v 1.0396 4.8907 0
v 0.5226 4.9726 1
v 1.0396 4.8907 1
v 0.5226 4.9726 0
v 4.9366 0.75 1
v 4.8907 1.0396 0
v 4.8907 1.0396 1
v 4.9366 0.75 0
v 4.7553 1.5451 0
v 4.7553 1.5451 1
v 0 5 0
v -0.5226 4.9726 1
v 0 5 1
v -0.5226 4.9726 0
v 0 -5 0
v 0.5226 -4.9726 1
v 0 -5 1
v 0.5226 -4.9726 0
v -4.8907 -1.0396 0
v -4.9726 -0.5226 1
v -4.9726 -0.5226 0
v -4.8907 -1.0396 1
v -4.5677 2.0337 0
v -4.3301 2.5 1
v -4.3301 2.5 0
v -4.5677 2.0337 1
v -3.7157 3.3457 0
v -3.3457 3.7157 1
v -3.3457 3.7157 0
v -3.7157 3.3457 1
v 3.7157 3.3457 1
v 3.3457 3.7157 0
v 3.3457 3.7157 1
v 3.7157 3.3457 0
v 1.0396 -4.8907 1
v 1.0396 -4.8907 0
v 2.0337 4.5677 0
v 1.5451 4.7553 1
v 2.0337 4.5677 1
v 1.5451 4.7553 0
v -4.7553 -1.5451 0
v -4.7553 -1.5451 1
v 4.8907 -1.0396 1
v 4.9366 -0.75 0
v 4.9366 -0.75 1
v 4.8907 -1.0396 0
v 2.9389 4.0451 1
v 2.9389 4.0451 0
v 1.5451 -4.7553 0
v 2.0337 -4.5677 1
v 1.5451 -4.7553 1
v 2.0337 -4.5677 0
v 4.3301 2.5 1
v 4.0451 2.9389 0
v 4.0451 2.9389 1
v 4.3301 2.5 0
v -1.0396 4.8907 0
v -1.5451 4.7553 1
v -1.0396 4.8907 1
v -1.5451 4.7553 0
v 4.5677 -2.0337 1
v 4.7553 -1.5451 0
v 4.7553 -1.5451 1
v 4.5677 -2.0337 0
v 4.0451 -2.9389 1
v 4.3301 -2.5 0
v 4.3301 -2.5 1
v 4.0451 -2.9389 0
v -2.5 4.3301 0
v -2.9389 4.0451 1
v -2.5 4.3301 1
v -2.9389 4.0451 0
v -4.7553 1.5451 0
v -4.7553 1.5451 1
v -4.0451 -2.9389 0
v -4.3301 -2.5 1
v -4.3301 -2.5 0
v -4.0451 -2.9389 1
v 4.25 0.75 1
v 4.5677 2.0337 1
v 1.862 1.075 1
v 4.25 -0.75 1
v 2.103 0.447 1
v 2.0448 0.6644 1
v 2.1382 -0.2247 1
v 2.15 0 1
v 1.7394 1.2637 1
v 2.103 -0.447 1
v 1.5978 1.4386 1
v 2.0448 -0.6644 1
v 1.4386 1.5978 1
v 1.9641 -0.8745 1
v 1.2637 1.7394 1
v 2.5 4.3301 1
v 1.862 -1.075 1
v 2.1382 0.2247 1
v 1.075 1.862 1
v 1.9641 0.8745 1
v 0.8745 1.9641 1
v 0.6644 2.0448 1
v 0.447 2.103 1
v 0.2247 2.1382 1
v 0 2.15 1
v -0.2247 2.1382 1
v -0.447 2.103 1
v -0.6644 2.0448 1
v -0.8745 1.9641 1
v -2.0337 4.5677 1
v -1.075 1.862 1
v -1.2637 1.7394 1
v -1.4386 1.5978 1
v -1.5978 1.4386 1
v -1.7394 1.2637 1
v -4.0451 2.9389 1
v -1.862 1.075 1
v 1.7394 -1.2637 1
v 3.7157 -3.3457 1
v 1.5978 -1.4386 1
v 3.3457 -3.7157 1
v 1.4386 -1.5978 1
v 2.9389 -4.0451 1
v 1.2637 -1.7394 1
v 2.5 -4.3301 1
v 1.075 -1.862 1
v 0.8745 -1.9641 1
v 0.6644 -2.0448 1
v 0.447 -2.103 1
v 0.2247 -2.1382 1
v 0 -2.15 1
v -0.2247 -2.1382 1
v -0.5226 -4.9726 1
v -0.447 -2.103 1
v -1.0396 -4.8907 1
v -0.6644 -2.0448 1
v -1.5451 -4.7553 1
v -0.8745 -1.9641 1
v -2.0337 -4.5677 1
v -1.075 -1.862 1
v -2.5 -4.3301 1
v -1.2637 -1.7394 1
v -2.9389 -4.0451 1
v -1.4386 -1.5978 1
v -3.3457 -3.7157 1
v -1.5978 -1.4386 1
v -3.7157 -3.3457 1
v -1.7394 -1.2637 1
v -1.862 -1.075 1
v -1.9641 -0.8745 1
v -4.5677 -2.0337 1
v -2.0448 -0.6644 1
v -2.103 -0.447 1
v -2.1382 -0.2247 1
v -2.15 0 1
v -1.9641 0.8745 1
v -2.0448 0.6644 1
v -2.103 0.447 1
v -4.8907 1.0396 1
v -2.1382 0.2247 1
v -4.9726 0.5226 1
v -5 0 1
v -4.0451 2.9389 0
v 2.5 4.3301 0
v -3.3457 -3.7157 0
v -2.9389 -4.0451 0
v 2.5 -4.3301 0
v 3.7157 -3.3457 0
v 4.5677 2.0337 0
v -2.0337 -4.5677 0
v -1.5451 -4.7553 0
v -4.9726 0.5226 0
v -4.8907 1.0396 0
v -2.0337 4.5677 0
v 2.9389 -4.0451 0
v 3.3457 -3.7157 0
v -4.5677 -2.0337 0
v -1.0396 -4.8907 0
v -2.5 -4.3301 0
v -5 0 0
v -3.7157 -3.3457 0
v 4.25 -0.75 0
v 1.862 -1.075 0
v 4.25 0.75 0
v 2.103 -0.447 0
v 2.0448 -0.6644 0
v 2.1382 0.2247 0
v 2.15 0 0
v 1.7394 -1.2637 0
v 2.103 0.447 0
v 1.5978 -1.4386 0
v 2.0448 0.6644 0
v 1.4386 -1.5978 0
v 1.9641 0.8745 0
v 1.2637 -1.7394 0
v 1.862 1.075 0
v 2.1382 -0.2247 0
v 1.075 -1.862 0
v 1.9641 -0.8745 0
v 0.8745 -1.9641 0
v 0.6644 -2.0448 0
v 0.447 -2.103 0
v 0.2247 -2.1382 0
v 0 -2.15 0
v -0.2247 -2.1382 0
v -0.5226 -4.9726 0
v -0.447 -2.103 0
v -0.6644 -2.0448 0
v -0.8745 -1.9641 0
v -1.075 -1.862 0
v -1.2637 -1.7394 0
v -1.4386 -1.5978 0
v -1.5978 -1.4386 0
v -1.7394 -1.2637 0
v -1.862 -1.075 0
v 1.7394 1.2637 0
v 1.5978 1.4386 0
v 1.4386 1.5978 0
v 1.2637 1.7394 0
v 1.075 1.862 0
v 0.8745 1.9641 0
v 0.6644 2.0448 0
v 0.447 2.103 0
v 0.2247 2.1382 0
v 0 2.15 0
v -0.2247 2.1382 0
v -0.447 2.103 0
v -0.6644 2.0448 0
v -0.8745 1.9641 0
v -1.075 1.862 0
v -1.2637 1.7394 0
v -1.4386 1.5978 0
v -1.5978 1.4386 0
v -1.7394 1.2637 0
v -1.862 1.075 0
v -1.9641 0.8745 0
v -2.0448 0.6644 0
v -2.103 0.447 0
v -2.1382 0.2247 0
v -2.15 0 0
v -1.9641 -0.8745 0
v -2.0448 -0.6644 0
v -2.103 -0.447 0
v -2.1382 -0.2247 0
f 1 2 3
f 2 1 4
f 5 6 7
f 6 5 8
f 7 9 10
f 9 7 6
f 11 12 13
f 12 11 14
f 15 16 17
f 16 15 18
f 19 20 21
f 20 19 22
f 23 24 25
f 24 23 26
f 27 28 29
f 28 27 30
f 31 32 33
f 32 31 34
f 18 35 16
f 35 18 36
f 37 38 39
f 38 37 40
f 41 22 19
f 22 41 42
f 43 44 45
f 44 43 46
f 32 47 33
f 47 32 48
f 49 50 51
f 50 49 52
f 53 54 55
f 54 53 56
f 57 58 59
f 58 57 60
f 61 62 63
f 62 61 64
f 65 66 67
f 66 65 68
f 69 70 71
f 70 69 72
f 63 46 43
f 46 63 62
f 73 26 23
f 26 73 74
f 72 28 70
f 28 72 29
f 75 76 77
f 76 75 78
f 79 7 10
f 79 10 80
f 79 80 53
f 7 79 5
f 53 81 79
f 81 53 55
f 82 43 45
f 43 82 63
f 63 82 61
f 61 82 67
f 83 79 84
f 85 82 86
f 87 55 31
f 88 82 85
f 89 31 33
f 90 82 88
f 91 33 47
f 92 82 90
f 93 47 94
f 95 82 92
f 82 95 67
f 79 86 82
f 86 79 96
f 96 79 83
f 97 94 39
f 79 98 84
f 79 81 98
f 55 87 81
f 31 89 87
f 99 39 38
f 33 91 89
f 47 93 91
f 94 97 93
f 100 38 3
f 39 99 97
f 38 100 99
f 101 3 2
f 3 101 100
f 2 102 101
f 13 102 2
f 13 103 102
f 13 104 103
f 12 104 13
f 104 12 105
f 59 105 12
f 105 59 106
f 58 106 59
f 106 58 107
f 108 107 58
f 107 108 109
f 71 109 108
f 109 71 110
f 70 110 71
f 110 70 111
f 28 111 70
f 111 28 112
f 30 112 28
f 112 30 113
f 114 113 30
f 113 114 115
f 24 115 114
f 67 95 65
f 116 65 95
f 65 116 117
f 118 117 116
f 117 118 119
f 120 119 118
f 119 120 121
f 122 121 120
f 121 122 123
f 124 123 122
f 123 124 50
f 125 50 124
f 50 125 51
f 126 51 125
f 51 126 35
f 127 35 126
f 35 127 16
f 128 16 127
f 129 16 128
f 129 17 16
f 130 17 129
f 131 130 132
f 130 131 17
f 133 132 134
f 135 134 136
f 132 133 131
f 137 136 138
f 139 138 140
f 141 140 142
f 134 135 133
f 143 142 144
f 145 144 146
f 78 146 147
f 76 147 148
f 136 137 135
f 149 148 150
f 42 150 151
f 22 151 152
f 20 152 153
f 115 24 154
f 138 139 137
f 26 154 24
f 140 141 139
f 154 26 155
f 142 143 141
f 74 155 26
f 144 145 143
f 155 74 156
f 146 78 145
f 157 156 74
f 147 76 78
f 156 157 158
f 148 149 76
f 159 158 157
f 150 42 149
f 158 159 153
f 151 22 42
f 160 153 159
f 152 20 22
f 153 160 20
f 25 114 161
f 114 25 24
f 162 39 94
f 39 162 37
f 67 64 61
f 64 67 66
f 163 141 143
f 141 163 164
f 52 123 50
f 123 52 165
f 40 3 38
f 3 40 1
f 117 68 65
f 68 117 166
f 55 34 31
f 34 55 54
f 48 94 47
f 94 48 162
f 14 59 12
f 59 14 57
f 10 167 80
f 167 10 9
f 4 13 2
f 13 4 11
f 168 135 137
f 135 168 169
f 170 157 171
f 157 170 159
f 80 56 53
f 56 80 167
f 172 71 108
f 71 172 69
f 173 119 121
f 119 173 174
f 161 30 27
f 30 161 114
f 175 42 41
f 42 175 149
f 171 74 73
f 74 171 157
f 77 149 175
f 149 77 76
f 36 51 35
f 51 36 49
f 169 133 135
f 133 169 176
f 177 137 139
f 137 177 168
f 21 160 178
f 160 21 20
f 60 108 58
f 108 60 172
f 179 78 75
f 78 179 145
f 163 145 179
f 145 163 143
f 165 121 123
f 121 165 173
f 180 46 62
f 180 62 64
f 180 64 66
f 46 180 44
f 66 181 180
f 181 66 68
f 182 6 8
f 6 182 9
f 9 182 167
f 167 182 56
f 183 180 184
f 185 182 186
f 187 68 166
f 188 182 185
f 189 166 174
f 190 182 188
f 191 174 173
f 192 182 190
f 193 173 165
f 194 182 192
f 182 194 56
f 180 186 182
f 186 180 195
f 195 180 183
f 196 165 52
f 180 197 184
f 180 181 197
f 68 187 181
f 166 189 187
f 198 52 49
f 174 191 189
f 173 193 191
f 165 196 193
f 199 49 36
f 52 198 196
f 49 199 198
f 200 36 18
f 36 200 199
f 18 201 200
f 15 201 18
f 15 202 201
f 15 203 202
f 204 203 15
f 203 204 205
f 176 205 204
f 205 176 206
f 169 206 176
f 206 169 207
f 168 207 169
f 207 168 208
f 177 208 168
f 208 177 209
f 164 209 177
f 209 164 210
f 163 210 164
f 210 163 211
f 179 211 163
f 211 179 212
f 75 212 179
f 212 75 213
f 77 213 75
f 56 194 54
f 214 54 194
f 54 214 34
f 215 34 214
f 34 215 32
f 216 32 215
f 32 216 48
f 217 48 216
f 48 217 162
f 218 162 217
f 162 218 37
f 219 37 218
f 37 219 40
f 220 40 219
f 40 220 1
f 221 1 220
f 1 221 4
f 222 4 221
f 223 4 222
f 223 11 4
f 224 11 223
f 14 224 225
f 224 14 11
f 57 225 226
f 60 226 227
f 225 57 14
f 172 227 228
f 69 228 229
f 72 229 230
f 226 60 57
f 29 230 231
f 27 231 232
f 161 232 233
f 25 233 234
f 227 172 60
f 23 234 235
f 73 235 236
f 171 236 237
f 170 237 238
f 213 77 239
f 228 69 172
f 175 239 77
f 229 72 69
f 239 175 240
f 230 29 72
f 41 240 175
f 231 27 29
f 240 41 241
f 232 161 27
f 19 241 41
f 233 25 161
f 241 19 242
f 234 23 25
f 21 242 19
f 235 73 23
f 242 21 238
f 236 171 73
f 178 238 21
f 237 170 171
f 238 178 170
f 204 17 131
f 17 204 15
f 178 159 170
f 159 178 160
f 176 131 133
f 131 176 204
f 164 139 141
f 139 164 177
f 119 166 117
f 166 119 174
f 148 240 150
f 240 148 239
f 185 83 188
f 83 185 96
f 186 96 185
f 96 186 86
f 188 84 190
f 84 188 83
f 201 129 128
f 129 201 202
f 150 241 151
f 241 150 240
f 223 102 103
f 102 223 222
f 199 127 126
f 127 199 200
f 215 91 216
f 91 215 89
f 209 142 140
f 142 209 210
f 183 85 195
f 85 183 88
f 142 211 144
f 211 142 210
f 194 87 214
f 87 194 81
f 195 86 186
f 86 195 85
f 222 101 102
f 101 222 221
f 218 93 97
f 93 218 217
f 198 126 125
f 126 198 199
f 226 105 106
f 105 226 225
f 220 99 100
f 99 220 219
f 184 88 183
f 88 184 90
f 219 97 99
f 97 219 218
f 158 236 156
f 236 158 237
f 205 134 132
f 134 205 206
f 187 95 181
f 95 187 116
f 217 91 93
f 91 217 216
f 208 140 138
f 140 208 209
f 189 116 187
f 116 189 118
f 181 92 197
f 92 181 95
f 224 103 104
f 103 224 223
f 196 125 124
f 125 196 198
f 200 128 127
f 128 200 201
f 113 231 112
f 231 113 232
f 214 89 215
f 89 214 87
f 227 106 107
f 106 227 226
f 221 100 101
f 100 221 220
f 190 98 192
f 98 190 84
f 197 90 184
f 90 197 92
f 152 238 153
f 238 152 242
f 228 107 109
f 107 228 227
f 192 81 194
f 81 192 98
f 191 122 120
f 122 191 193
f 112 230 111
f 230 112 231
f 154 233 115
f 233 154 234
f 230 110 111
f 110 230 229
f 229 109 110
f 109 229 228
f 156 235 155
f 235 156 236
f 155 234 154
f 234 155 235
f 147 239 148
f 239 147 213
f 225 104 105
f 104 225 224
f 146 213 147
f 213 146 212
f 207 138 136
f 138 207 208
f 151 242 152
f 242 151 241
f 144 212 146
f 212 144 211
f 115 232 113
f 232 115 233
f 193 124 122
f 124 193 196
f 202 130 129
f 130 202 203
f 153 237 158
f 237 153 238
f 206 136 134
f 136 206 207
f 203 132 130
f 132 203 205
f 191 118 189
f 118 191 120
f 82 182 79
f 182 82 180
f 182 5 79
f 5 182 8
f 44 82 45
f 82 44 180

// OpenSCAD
// Split lock washer.
$fn = 60;
eps = 0.02;
inner_d = 4.3;
outer_d = 10;
thickness = 1;
gap = 1.5;
difference() {
    cylinder(d=outer_d,h=thickness);
    translate([0,0,-eps]) cylinder(d=inner_d,h=thickness+2*eps);
    translate([outer_d/2-gap/2,-gap/2,-eps]) cube([gap+eps,gap,thickness+2*eps]);
}
